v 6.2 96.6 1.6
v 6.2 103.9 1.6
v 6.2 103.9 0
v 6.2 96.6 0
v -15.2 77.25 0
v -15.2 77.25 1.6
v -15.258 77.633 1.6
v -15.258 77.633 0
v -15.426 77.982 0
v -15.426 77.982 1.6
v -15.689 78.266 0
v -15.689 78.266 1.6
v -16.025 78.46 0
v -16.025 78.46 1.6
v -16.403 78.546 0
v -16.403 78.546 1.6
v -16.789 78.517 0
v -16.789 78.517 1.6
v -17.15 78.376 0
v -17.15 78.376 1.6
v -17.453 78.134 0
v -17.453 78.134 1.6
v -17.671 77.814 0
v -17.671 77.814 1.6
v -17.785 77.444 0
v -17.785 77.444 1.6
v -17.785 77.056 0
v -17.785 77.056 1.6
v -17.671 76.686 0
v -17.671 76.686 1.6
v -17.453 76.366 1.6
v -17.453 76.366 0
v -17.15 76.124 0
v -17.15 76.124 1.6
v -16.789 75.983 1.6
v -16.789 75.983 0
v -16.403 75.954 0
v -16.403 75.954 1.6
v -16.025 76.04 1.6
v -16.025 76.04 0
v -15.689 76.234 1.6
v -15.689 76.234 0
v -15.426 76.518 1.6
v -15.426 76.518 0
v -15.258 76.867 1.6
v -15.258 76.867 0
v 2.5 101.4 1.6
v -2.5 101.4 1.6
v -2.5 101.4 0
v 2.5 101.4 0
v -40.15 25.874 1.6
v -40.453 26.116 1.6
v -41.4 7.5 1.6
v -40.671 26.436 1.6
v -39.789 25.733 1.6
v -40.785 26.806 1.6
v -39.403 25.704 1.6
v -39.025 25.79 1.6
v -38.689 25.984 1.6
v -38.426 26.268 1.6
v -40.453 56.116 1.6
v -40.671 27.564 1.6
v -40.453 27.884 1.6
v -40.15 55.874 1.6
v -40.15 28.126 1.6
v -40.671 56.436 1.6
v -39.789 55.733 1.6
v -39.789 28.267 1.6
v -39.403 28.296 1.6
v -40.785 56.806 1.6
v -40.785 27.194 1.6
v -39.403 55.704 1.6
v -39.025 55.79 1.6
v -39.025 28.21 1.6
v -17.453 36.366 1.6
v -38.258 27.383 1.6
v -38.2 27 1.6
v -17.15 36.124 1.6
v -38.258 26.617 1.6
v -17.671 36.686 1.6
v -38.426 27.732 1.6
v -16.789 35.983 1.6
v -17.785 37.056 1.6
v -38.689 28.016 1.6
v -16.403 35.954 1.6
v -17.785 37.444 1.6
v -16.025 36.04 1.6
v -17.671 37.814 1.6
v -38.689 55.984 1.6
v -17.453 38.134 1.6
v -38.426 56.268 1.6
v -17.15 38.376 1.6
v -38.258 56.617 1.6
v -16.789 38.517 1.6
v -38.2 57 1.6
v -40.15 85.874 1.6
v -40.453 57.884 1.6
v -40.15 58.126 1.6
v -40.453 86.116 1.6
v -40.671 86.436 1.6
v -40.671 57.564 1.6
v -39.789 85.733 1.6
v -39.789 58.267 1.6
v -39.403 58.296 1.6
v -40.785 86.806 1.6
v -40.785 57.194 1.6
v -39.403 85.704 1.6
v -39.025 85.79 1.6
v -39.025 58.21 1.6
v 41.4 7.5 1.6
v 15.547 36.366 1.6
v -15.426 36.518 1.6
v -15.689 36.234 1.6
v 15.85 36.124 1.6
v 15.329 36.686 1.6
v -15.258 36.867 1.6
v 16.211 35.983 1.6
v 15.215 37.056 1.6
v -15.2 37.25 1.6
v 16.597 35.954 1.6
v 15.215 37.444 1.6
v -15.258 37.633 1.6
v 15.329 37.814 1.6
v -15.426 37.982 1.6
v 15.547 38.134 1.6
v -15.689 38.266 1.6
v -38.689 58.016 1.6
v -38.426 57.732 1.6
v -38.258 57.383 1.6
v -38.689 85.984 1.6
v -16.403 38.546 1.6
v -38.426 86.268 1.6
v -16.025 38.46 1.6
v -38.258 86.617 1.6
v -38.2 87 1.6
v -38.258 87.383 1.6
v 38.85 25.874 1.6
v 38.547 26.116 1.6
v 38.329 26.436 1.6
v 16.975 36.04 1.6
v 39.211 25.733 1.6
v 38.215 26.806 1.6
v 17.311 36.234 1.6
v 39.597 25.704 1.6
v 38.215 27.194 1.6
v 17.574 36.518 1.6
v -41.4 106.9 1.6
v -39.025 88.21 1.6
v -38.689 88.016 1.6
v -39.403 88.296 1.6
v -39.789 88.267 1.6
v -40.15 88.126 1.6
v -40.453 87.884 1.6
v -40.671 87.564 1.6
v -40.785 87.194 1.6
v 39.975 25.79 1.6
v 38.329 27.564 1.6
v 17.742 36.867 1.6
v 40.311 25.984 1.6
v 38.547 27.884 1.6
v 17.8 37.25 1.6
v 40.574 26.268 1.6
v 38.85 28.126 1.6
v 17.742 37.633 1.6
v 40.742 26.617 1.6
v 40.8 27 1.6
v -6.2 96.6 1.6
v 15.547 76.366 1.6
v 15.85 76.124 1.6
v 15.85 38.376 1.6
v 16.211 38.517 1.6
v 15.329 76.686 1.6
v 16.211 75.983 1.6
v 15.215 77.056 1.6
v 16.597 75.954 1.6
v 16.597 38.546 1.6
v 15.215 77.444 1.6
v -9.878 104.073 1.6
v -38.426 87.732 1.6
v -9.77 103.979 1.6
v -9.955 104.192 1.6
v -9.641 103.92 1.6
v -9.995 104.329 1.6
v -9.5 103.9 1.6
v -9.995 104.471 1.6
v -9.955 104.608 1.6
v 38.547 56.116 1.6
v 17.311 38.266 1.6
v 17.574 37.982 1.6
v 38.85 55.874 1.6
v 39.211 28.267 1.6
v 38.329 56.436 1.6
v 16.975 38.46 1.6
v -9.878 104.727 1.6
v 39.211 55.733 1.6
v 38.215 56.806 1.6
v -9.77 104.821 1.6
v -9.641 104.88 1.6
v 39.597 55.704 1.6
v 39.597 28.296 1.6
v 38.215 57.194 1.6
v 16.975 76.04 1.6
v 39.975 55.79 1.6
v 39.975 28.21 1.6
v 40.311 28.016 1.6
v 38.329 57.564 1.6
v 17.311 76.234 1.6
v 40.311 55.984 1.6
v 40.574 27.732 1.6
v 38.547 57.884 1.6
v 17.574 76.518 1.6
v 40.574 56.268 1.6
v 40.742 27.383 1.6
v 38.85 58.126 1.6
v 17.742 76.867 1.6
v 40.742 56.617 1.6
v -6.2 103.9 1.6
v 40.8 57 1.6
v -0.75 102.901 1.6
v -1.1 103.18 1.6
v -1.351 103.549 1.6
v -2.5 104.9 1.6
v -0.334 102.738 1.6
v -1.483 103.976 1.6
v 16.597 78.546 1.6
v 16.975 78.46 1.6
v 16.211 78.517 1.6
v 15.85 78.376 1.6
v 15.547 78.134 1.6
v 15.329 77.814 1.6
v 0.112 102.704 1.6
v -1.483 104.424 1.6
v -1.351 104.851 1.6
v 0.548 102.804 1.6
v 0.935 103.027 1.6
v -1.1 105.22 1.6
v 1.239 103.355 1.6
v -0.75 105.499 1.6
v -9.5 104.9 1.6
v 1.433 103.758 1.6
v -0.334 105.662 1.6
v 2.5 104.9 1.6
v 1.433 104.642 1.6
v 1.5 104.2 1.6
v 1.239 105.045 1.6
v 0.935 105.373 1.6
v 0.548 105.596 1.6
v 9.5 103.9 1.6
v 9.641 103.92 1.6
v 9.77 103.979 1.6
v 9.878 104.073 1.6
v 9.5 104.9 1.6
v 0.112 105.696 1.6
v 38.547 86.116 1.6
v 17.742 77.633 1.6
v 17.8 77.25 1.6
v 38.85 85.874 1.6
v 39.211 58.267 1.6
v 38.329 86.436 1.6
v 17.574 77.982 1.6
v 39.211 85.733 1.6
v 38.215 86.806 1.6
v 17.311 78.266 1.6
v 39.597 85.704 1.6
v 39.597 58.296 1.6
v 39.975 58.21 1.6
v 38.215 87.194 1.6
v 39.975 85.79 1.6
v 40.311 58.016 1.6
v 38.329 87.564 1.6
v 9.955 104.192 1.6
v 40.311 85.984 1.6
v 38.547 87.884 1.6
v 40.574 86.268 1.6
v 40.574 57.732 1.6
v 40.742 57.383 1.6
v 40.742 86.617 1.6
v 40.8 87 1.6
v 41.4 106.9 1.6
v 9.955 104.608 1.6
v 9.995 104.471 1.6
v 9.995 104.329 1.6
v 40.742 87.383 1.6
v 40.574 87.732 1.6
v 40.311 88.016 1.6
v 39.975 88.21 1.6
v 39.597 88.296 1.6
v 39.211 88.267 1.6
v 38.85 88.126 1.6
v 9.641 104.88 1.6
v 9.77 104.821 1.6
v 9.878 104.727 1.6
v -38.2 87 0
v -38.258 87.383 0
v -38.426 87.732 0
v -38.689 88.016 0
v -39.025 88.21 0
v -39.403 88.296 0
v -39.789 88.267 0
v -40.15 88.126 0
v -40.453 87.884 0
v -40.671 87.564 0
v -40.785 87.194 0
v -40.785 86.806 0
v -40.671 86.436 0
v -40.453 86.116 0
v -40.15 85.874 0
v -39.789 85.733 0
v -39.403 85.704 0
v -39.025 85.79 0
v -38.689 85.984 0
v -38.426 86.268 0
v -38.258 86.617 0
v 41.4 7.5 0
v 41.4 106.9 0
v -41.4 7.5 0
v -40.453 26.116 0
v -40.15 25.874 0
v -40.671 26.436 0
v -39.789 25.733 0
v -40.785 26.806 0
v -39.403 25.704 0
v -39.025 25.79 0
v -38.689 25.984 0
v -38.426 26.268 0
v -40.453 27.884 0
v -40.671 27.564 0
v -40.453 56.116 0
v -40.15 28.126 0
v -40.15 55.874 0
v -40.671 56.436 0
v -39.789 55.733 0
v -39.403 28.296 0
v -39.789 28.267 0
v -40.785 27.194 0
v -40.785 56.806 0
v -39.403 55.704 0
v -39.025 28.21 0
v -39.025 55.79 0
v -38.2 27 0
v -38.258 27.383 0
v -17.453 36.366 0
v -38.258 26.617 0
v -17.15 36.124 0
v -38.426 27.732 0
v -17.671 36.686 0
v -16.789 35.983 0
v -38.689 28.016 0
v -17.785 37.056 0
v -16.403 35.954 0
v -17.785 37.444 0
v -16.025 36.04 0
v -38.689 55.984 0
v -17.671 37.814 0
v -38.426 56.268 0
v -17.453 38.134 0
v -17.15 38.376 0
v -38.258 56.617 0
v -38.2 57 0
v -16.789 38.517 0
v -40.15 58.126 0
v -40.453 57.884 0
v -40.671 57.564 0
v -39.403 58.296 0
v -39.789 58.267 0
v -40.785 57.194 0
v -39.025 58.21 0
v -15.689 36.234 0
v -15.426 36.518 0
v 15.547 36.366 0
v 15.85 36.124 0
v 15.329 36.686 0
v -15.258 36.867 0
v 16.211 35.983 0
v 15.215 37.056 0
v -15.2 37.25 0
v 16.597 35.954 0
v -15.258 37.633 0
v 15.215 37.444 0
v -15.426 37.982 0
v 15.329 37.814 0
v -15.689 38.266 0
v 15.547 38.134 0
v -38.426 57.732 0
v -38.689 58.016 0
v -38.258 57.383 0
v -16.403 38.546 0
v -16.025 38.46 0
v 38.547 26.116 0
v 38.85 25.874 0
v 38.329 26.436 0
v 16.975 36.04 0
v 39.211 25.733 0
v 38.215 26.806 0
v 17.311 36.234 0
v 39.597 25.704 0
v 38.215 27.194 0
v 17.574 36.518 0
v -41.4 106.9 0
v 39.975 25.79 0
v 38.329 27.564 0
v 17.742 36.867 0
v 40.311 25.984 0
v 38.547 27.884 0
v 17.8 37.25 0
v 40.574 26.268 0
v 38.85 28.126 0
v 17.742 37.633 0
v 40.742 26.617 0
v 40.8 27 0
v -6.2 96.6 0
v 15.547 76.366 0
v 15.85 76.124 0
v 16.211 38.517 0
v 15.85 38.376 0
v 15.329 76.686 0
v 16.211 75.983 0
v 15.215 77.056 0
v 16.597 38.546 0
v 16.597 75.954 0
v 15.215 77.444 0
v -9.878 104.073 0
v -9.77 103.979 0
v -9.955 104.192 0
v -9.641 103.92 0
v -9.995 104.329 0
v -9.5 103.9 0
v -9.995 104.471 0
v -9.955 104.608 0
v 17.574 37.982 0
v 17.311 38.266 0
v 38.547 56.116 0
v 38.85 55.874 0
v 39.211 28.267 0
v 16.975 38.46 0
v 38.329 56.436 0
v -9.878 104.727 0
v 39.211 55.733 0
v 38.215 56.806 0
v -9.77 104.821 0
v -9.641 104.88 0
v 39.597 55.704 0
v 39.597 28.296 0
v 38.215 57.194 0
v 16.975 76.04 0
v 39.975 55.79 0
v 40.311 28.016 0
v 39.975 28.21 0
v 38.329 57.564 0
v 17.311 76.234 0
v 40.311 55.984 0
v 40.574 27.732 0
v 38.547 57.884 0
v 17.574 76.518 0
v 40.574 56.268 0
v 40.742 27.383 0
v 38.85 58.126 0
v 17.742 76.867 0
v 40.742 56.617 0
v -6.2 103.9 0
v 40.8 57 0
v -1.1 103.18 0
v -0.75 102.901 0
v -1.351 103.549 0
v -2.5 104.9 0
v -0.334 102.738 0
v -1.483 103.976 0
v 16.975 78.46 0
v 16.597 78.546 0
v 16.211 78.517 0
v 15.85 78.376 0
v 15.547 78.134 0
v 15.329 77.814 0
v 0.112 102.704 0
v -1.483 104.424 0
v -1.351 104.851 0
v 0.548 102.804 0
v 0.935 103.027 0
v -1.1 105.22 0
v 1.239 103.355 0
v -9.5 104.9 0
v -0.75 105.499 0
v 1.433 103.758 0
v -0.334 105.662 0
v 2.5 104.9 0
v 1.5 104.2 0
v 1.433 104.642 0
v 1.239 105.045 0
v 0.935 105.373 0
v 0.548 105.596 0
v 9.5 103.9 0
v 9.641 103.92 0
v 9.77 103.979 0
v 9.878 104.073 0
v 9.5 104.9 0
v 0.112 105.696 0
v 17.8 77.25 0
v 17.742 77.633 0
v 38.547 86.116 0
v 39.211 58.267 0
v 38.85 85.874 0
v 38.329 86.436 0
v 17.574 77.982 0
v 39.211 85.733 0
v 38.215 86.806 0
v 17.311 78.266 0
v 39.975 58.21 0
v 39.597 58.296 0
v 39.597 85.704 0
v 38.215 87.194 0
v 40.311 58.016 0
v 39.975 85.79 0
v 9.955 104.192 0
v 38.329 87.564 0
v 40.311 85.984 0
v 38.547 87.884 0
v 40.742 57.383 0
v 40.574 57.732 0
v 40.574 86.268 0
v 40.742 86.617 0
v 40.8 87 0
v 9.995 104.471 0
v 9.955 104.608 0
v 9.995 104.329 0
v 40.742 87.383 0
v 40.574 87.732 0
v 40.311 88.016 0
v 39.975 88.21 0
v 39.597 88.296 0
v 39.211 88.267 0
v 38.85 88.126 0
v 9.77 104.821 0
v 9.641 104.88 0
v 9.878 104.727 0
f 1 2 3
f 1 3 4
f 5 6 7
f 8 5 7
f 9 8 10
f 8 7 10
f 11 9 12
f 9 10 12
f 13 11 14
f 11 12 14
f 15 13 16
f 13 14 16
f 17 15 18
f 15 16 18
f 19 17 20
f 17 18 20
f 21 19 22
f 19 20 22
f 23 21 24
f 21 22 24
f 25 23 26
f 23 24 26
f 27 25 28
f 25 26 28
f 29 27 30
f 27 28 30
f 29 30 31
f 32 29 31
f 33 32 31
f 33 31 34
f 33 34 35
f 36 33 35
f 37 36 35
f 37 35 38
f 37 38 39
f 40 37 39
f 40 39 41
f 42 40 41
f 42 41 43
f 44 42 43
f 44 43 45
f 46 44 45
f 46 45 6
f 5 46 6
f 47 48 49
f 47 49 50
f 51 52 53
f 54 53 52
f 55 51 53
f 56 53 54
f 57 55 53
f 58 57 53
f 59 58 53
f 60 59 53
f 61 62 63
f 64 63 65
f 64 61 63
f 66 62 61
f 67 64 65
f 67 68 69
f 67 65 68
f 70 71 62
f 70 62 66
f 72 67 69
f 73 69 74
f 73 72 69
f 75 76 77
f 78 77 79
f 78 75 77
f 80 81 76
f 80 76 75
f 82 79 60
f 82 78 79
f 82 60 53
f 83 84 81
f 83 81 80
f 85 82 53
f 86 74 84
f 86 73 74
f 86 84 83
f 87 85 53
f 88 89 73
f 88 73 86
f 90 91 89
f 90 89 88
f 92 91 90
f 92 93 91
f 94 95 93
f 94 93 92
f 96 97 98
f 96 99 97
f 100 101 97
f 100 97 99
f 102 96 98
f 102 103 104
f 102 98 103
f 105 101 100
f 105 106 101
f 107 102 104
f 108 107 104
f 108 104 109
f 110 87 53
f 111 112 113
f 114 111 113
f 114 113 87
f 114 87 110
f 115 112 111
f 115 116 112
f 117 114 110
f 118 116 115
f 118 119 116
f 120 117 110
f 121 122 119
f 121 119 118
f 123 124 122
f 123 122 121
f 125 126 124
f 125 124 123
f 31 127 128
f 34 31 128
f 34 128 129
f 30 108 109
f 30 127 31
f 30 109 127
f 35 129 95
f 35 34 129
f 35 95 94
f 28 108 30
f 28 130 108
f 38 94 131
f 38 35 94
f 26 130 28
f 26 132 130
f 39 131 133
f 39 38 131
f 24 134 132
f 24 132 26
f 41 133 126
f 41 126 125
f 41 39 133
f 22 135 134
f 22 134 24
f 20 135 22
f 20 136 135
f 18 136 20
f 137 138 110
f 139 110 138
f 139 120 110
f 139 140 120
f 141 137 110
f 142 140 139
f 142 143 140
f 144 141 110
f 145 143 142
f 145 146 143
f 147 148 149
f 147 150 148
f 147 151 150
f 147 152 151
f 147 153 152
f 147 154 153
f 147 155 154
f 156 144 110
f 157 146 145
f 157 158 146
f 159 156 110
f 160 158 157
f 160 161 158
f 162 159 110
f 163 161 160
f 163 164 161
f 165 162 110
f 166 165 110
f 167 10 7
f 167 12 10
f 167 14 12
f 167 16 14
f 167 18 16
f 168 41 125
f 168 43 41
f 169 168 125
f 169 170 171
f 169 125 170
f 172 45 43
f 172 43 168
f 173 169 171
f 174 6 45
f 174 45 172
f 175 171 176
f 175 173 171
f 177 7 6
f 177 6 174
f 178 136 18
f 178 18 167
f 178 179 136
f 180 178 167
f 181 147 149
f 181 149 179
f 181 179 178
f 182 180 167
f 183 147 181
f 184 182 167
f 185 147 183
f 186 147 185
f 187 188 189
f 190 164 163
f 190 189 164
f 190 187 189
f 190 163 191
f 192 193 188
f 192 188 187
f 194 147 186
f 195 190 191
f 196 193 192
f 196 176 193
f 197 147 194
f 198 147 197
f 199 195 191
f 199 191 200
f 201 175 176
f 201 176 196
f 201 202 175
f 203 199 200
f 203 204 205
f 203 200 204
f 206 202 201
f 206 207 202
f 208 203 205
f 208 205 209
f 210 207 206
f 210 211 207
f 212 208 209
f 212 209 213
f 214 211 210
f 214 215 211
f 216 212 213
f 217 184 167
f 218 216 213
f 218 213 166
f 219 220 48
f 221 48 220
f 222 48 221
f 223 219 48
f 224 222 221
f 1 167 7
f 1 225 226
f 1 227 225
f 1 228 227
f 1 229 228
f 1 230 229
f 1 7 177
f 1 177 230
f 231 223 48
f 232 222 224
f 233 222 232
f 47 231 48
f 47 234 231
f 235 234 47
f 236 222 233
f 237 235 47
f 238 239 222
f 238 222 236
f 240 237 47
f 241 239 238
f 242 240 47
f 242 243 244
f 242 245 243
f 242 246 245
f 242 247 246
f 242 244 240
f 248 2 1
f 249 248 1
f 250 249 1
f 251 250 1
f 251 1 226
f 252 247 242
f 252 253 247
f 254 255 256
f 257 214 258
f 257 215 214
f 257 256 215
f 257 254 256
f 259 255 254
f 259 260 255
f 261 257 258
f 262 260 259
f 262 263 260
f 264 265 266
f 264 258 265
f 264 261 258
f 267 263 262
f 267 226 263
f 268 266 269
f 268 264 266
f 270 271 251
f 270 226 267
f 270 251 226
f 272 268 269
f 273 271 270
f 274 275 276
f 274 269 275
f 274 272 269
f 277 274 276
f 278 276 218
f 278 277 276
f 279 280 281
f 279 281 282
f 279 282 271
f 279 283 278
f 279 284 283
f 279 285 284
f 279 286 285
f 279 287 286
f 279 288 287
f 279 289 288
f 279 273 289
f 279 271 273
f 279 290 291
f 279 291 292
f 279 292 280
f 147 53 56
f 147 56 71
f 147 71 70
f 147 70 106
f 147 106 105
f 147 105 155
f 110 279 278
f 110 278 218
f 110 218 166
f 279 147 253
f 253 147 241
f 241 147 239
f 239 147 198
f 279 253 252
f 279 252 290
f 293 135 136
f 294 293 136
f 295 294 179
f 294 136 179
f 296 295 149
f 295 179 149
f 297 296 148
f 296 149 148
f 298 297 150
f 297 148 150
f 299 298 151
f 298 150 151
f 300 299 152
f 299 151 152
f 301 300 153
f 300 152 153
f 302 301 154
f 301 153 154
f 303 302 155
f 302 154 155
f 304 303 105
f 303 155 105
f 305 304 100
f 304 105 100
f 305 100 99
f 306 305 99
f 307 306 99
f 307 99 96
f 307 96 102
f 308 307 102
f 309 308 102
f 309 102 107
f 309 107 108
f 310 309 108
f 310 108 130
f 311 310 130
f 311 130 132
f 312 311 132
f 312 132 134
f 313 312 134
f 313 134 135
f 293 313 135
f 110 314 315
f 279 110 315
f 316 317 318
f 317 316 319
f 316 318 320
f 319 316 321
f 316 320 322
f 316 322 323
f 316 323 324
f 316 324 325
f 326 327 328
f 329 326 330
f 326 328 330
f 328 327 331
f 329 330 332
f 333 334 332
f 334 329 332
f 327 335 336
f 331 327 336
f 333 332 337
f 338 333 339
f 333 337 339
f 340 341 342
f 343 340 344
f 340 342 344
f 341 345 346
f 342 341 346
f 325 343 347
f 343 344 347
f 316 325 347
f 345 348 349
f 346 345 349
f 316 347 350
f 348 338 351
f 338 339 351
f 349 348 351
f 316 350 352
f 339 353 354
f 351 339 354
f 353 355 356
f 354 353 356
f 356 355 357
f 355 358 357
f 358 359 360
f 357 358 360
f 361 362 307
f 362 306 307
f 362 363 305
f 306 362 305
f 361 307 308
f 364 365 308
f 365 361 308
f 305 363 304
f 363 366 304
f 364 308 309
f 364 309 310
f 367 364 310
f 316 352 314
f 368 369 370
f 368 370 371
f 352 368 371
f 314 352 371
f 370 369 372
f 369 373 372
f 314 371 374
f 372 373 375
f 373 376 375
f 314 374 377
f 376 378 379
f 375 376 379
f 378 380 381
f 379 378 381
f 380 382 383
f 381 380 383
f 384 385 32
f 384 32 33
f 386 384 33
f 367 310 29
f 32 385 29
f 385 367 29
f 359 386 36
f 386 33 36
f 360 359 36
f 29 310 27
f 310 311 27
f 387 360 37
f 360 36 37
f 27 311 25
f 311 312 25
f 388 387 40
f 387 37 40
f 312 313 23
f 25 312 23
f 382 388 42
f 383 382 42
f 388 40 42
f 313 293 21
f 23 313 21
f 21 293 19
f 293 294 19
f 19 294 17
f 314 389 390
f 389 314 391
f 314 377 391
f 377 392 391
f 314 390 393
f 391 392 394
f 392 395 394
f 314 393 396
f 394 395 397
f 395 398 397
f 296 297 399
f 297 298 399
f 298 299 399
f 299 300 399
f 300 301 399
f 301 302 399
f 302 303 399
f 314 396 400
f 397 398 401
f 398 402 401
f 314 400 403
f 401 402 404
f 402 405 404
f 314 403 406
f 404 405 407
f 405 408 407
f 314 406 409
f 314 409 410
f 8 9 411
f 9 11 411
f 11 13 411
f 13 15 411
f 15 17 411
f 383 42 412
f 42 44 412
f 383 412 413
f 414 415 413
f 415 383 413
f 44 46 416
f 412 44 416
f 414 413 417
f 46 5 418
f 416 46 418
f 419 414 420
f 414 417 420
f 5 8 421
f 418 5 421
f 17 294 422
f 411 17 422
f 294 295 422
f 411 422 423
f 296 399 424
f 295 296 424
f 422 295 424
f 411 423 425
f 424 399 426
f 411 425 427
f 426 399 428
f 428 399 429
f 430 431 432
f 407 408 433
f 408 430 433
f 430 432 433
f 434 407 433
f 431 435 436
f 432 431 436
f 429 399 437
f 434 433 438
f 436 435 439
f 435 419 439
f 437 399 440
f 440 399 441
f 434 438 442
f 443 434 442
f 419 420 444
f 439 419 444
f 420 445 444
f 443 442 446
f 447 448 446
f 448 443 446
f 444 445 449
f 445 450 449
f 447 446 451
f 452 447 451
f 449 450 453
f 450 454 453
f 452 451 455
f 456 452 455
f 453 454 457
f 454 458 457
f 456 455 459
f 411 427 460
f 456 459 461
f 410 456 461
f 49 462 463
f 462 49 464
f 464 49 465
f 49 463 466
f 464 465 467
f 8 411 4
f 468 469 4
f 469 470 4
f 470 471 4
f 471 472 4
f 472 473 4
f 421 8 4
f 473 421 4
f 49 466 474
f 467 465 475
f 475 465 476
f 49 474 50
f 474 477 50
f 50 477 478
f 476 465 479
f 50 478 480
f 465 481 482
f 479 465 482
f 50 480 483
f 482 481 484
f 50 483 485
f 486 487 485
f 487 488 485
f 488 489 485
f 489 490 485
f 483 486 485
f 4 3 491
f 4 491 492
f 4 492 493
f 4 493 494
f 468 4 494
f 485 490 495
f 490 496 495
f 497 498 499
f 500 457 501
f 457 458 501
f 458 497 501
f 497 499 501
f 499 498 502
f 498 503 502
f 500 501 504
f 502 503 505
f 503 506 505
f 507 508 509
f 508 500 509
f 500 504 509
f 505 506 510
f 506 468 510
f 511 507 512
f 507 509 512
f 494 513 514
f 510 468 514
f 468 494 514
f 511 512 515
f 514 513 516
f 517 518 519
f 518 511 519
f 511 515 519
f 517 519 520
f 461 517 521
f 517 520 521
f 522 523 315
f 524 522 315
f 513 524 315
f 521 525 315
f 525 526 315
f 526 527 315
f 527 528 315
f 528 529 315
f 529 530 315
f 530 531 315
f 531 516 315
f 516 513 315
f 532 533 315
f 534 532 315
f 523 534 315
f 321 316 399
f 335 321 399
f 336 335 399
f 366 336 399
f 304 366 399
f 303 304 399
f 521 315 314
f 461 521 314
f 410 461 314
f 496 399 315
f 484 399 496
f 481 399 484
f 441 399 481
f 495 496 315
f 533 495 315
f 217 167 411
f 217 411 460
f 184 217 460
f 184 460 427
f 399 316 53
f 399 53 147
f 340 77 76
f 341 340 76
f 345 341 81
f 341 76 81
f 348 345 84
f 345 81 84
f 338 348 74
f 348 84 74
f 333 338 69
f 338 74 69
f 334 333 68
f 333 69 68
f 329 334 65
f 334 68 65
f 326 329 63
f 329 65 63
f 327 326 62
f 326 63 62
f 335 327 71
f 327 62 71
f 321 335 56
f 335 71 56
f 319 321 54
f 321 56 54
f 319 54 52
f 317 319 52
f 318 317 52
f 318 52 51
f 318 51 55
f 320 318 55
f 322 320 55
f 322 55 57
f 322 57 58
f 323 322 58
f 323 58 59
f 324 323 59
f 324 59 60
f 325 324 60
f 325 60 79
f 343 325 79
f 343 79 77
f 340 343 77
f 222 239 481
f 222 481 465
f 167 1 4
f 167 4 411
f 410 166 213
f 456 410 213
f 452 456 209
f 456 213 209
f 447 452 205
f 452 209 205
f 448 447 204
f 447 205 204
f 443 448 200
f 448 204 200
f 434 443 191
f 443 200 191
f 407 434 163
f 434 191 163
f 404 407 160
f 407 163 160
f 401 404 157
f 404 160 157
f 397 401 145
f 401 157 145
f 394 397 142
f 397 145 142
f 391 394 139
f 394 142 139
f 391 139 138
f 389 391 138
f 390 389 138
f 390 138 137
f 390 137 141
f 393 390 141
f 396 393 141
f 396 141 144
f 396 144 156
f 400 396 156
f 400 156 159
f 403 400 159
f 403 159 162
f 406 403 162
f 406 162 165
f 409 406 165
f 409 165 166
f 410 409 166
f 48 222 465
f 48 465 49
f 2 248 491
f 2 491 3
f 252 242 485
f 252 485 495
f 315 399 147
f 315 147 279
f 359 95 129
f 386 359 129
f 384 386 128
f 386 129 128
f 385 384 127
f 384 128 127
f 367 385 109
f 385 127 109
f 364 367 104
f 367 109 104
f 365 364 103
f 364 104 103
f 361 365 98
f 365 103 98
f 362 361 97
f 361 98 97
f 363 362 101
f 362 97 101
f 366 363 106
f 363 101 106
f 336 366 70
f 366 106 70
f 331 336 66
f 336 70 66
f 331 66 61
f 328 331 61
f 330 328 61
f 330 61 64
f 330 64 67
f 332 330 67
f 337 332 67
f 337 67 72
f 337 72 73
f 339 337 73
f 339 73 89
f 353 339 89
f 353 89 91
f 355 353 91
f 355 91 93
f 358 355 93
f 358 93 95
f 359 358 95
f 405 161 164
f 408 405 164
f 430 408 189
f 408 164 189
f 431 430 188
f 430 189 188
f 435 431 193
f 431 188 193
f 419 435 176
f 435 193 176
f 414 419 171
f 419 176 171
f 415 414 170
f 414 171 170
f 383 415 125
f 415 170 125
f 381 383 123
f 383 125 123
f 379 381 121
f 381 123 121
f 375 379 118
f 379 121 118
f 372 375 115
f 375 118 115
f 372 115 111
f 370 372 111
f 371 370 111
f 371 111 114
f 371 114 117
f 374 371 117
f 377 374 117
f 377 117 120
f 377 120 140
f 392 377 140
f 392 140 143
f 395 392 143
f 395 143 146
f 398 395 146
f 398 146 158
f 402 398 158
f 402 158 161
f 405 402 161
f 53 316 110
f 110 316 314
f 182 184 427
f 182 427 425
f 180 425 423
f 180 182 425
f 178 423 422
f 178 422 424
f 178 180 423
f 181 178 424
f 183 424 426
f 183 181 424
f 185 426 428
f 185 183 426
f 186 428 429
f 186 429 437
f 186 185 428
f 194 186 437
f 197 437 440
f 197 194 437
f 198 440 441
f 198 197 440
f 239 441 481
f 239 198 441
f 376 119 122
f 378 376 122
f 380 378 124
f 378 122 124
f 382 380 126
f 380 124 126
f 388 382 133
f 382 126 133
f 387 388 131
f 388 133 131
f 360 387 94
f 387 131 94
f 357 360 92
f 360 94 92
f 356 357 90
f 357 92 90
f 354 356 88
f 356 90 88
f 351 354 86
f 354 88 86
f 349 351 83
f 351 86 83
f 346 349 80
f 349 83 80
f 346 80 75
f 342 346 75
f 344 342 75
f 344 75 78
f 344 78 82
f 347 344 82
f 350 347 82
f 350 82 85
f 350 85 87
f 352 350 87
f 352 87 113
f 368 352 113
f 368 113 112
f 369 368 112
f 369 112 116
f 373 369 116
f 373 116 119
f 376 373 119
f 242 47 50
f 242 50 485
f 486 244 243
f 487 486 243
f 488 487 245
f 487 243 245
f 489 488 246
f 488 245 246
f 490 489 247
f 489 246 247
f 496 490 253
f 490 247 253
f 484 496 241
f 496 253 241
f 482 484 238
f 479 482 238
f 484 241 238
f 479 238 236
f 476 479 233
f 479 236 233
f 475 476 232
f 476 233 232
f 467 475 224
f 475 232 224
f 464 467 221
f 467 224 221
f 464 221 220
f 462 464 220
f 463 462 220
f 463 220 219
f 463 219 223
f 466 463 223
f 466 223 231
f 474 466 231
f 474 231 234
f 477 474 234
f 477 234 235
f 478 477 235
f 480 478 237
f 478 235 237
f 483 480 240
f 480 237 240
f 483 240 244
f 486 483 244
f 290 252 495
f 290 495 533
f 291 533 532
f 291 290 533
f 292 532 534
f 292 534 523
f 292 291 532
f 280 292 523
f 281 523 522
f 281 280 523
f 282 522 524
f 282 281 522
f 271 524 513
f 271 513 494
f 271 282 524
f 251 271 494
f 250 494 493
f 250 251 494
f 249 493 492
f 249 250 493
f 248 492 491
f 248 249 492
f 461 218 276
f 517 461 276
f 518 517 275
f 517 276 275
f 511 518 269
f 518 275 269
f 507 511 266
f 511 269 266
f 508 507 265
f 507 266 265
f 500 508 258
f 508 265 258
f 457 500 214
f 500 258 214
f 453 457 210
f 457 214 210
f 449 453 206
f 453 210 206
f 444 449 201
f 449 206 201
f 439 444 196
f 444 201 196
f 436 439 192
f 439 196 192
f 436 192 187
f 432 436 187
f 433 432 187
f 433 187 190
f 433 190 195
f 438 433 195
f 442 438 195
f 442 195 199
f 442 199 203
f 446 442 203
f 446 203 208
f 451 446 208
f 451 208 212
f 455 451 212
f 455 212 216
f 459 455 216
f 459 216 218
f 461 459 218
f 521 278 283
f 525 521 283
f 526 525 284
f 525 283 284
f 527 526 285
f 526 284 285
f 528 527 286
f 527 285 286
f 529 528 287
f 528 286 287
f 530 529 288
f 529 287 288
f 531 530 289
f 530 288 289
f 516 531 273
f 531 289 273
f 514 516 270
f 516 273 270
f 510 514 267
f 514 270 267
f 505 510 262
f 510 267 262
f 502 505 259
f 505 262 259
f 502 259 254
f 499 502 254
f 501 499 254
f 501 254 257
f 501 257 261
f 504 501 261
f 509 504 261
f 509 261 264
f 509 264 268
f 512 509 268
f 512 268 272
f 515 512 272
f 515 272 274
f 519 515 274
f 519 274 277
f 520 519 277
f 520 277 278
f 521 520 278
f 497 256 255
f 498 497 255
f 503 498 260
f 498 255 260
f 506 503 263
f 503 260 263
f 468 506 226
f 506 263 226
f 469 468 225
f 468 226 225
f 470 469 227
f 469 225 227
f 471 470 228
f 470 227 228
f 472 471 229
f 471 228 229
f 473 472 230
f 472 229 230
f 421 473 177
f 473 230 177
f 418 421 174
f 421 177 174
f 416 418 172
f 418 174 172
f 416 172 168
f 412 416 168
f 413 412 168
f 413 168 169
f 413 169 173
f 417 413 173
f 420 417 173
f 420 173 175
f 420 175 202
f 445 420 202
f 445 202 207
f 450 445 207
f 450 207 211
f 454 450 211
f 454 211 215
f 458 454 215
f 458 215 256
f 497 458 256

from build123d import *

# Parameters (mm, degrees)
SKETCH1_W               = 82.8
SKETCH1_H               = 213.8
SKETCH1_R               = 0.8
PCB_EXTRUDE_DEPTH       = 1.6
SKETCH3_R               = 1.5
SOLAR_HOLE_DEPTH        = 1.6
CUT_EXTRUDE1_DEPTH      = 115.647852139
CUT_EXTRUDE1_DEPTH_BACK = 115.647852139
SKETCH8_W               = 82.8
SKETCH8_H               = 114.4
M2_CLEARANCE_HOLE1_D    = 2.6


with BuildPart() as part:
    # Sketch1 → pcb extrude (new body)
    with BuildSketch(Plane.XY):
        Rectangle(SKETCH1_W, SKETCH1_H)
        with Locations((-39.5, -27)):
            Circle(SKETCH1_R, mode=Mode.SUBTRACT)
        with Locations((39.5, -27)):
            Circle(SKETCH1_R, mode=Mode.SUBTRACT)
        with Locations((-39.5, 87)):
            Circle(SKETCH1_R, mode=Mode.SUBTRACT)
        with Locations((-39.5, 57)):
            Circle(SKETCH1_R, mode=Mode.SUBTRACT)
        with Locations((-39.5, 27)):
            Circle(SKETCH1_R, mode=Mode.SUBTRACT)
        with Locations((-39.5, -57)):
            Circle(SKETCH1_R, mode=Mode.SUBTRACT)
        with Locations((-39.5, -87)):
            Circle(SKETCH1_R, mode=Mode.SUBTRACT)
        with Locations((0, -104.2)):
            Circle(SKETCH1_R, mode=Mode.SUBTRACT)
        with Locations((39.5, -87)):
            Circle(SKETCH1_R, mode=Mode.SUBTRACT)
        with Locations((39.5, -57)):
            Circle(SKETCH1_R, mode=Mode.SUBTRACT)
        with Locations((39.5, 27)):
            Circle(SKETCH1_R, mode=Mode.SUBTRACT)
        with Locations((39.5, 57)):
            Circle(SKETCH1_R, mode=Mode.SUBTRACT)
        with Locations((39.5, 87)):
            Circle(SKETCH1_R, mode=Mode.SUBTRACT)
        with Locations((0, 104.2)):
            Circle(SKETCH1_R, mode=Mode.SUBTRACT)
    extrude(amount=PCB_EXTRUDE_DEPTH)

    # Sketch3 → Solar Hole (cut)
    with BuildSketch(Plane.XY.offset(1.6)):
        with Locations((0, 104.2)):
            Circle(SKETCH3_R)
        with BuildLine():
            Line((-2.5, 101.4), (2.5, 101.4))
            Line((2.5, 101.4), (2.5, 104.9))
            Line((2.5, 104.9), (9.5, 104.9))
            ThreePointArc((9.5, 104.9), (10, 104.4), (9.5, 103.9))
            Line((9.5, 103.9), (6.2, 103.9))
            Line((6.2, 103.9), (6.2, 101.4))
            Line((6.2, 101.4), (6.2, 96.6))
            Line((6.2, 96.6), (-6.2, 96.6))
            Line((-6.2, 96.6), (-6.2, 101.4))
            Line((-6.2, 101.4), (-6.2, 103.9))
            Line((-6.2, 103.9), (-9.5, 103.9))
            ThreePointArc((-9.5, 103.9), (-10, 104.4), (-9.5, 104.9))
            Line((-9.5, 104.9), (-2.5, 104.9))
            Line((-2.5, 104.9), (-2.5, 101.4))
        make_face()
    extrude(amount=-SOLAR_HOLE_DEPTH, mode=Mode.SUBTRACT)

    # Sketch8 → Cut-Extrude1 (cut, two sides: drawn at the far end of the back side and taken through both)
    with BuildSketch(Plane.XY.offset(1.6).offset(-CUT_EXTRUDE1_DEPTH_BACK)):
        with Locations((0, -49.7)):
            Rectangle(SKETCH8_W, SKETCH8_H)
    extrude(amount=CUT_EXTRUDE1_DEPTH + CUT_EXTRUDE1_DEPTH_BACK, mode=Mode.SUBTRACT)

    # M2 Clearance Hole1 (through all)
    with Locations(Plane(origin=(0, 0, 0), x_dir=(-1, 0, 0), z_dir=(0, 0, -1))):
        with Locations((39.5, 87), (-39.5, 87), (39.5, 57), (-39.5, 57), (39.5, 27), (-39.5, 27), (16.5, 77.25), (-16.5, 77.25), (-16.5, 37.25), (16.5, 37.25)):
            Hole(M2_CLEARANCE_HOLE1_D / 2)


solid = part.part
